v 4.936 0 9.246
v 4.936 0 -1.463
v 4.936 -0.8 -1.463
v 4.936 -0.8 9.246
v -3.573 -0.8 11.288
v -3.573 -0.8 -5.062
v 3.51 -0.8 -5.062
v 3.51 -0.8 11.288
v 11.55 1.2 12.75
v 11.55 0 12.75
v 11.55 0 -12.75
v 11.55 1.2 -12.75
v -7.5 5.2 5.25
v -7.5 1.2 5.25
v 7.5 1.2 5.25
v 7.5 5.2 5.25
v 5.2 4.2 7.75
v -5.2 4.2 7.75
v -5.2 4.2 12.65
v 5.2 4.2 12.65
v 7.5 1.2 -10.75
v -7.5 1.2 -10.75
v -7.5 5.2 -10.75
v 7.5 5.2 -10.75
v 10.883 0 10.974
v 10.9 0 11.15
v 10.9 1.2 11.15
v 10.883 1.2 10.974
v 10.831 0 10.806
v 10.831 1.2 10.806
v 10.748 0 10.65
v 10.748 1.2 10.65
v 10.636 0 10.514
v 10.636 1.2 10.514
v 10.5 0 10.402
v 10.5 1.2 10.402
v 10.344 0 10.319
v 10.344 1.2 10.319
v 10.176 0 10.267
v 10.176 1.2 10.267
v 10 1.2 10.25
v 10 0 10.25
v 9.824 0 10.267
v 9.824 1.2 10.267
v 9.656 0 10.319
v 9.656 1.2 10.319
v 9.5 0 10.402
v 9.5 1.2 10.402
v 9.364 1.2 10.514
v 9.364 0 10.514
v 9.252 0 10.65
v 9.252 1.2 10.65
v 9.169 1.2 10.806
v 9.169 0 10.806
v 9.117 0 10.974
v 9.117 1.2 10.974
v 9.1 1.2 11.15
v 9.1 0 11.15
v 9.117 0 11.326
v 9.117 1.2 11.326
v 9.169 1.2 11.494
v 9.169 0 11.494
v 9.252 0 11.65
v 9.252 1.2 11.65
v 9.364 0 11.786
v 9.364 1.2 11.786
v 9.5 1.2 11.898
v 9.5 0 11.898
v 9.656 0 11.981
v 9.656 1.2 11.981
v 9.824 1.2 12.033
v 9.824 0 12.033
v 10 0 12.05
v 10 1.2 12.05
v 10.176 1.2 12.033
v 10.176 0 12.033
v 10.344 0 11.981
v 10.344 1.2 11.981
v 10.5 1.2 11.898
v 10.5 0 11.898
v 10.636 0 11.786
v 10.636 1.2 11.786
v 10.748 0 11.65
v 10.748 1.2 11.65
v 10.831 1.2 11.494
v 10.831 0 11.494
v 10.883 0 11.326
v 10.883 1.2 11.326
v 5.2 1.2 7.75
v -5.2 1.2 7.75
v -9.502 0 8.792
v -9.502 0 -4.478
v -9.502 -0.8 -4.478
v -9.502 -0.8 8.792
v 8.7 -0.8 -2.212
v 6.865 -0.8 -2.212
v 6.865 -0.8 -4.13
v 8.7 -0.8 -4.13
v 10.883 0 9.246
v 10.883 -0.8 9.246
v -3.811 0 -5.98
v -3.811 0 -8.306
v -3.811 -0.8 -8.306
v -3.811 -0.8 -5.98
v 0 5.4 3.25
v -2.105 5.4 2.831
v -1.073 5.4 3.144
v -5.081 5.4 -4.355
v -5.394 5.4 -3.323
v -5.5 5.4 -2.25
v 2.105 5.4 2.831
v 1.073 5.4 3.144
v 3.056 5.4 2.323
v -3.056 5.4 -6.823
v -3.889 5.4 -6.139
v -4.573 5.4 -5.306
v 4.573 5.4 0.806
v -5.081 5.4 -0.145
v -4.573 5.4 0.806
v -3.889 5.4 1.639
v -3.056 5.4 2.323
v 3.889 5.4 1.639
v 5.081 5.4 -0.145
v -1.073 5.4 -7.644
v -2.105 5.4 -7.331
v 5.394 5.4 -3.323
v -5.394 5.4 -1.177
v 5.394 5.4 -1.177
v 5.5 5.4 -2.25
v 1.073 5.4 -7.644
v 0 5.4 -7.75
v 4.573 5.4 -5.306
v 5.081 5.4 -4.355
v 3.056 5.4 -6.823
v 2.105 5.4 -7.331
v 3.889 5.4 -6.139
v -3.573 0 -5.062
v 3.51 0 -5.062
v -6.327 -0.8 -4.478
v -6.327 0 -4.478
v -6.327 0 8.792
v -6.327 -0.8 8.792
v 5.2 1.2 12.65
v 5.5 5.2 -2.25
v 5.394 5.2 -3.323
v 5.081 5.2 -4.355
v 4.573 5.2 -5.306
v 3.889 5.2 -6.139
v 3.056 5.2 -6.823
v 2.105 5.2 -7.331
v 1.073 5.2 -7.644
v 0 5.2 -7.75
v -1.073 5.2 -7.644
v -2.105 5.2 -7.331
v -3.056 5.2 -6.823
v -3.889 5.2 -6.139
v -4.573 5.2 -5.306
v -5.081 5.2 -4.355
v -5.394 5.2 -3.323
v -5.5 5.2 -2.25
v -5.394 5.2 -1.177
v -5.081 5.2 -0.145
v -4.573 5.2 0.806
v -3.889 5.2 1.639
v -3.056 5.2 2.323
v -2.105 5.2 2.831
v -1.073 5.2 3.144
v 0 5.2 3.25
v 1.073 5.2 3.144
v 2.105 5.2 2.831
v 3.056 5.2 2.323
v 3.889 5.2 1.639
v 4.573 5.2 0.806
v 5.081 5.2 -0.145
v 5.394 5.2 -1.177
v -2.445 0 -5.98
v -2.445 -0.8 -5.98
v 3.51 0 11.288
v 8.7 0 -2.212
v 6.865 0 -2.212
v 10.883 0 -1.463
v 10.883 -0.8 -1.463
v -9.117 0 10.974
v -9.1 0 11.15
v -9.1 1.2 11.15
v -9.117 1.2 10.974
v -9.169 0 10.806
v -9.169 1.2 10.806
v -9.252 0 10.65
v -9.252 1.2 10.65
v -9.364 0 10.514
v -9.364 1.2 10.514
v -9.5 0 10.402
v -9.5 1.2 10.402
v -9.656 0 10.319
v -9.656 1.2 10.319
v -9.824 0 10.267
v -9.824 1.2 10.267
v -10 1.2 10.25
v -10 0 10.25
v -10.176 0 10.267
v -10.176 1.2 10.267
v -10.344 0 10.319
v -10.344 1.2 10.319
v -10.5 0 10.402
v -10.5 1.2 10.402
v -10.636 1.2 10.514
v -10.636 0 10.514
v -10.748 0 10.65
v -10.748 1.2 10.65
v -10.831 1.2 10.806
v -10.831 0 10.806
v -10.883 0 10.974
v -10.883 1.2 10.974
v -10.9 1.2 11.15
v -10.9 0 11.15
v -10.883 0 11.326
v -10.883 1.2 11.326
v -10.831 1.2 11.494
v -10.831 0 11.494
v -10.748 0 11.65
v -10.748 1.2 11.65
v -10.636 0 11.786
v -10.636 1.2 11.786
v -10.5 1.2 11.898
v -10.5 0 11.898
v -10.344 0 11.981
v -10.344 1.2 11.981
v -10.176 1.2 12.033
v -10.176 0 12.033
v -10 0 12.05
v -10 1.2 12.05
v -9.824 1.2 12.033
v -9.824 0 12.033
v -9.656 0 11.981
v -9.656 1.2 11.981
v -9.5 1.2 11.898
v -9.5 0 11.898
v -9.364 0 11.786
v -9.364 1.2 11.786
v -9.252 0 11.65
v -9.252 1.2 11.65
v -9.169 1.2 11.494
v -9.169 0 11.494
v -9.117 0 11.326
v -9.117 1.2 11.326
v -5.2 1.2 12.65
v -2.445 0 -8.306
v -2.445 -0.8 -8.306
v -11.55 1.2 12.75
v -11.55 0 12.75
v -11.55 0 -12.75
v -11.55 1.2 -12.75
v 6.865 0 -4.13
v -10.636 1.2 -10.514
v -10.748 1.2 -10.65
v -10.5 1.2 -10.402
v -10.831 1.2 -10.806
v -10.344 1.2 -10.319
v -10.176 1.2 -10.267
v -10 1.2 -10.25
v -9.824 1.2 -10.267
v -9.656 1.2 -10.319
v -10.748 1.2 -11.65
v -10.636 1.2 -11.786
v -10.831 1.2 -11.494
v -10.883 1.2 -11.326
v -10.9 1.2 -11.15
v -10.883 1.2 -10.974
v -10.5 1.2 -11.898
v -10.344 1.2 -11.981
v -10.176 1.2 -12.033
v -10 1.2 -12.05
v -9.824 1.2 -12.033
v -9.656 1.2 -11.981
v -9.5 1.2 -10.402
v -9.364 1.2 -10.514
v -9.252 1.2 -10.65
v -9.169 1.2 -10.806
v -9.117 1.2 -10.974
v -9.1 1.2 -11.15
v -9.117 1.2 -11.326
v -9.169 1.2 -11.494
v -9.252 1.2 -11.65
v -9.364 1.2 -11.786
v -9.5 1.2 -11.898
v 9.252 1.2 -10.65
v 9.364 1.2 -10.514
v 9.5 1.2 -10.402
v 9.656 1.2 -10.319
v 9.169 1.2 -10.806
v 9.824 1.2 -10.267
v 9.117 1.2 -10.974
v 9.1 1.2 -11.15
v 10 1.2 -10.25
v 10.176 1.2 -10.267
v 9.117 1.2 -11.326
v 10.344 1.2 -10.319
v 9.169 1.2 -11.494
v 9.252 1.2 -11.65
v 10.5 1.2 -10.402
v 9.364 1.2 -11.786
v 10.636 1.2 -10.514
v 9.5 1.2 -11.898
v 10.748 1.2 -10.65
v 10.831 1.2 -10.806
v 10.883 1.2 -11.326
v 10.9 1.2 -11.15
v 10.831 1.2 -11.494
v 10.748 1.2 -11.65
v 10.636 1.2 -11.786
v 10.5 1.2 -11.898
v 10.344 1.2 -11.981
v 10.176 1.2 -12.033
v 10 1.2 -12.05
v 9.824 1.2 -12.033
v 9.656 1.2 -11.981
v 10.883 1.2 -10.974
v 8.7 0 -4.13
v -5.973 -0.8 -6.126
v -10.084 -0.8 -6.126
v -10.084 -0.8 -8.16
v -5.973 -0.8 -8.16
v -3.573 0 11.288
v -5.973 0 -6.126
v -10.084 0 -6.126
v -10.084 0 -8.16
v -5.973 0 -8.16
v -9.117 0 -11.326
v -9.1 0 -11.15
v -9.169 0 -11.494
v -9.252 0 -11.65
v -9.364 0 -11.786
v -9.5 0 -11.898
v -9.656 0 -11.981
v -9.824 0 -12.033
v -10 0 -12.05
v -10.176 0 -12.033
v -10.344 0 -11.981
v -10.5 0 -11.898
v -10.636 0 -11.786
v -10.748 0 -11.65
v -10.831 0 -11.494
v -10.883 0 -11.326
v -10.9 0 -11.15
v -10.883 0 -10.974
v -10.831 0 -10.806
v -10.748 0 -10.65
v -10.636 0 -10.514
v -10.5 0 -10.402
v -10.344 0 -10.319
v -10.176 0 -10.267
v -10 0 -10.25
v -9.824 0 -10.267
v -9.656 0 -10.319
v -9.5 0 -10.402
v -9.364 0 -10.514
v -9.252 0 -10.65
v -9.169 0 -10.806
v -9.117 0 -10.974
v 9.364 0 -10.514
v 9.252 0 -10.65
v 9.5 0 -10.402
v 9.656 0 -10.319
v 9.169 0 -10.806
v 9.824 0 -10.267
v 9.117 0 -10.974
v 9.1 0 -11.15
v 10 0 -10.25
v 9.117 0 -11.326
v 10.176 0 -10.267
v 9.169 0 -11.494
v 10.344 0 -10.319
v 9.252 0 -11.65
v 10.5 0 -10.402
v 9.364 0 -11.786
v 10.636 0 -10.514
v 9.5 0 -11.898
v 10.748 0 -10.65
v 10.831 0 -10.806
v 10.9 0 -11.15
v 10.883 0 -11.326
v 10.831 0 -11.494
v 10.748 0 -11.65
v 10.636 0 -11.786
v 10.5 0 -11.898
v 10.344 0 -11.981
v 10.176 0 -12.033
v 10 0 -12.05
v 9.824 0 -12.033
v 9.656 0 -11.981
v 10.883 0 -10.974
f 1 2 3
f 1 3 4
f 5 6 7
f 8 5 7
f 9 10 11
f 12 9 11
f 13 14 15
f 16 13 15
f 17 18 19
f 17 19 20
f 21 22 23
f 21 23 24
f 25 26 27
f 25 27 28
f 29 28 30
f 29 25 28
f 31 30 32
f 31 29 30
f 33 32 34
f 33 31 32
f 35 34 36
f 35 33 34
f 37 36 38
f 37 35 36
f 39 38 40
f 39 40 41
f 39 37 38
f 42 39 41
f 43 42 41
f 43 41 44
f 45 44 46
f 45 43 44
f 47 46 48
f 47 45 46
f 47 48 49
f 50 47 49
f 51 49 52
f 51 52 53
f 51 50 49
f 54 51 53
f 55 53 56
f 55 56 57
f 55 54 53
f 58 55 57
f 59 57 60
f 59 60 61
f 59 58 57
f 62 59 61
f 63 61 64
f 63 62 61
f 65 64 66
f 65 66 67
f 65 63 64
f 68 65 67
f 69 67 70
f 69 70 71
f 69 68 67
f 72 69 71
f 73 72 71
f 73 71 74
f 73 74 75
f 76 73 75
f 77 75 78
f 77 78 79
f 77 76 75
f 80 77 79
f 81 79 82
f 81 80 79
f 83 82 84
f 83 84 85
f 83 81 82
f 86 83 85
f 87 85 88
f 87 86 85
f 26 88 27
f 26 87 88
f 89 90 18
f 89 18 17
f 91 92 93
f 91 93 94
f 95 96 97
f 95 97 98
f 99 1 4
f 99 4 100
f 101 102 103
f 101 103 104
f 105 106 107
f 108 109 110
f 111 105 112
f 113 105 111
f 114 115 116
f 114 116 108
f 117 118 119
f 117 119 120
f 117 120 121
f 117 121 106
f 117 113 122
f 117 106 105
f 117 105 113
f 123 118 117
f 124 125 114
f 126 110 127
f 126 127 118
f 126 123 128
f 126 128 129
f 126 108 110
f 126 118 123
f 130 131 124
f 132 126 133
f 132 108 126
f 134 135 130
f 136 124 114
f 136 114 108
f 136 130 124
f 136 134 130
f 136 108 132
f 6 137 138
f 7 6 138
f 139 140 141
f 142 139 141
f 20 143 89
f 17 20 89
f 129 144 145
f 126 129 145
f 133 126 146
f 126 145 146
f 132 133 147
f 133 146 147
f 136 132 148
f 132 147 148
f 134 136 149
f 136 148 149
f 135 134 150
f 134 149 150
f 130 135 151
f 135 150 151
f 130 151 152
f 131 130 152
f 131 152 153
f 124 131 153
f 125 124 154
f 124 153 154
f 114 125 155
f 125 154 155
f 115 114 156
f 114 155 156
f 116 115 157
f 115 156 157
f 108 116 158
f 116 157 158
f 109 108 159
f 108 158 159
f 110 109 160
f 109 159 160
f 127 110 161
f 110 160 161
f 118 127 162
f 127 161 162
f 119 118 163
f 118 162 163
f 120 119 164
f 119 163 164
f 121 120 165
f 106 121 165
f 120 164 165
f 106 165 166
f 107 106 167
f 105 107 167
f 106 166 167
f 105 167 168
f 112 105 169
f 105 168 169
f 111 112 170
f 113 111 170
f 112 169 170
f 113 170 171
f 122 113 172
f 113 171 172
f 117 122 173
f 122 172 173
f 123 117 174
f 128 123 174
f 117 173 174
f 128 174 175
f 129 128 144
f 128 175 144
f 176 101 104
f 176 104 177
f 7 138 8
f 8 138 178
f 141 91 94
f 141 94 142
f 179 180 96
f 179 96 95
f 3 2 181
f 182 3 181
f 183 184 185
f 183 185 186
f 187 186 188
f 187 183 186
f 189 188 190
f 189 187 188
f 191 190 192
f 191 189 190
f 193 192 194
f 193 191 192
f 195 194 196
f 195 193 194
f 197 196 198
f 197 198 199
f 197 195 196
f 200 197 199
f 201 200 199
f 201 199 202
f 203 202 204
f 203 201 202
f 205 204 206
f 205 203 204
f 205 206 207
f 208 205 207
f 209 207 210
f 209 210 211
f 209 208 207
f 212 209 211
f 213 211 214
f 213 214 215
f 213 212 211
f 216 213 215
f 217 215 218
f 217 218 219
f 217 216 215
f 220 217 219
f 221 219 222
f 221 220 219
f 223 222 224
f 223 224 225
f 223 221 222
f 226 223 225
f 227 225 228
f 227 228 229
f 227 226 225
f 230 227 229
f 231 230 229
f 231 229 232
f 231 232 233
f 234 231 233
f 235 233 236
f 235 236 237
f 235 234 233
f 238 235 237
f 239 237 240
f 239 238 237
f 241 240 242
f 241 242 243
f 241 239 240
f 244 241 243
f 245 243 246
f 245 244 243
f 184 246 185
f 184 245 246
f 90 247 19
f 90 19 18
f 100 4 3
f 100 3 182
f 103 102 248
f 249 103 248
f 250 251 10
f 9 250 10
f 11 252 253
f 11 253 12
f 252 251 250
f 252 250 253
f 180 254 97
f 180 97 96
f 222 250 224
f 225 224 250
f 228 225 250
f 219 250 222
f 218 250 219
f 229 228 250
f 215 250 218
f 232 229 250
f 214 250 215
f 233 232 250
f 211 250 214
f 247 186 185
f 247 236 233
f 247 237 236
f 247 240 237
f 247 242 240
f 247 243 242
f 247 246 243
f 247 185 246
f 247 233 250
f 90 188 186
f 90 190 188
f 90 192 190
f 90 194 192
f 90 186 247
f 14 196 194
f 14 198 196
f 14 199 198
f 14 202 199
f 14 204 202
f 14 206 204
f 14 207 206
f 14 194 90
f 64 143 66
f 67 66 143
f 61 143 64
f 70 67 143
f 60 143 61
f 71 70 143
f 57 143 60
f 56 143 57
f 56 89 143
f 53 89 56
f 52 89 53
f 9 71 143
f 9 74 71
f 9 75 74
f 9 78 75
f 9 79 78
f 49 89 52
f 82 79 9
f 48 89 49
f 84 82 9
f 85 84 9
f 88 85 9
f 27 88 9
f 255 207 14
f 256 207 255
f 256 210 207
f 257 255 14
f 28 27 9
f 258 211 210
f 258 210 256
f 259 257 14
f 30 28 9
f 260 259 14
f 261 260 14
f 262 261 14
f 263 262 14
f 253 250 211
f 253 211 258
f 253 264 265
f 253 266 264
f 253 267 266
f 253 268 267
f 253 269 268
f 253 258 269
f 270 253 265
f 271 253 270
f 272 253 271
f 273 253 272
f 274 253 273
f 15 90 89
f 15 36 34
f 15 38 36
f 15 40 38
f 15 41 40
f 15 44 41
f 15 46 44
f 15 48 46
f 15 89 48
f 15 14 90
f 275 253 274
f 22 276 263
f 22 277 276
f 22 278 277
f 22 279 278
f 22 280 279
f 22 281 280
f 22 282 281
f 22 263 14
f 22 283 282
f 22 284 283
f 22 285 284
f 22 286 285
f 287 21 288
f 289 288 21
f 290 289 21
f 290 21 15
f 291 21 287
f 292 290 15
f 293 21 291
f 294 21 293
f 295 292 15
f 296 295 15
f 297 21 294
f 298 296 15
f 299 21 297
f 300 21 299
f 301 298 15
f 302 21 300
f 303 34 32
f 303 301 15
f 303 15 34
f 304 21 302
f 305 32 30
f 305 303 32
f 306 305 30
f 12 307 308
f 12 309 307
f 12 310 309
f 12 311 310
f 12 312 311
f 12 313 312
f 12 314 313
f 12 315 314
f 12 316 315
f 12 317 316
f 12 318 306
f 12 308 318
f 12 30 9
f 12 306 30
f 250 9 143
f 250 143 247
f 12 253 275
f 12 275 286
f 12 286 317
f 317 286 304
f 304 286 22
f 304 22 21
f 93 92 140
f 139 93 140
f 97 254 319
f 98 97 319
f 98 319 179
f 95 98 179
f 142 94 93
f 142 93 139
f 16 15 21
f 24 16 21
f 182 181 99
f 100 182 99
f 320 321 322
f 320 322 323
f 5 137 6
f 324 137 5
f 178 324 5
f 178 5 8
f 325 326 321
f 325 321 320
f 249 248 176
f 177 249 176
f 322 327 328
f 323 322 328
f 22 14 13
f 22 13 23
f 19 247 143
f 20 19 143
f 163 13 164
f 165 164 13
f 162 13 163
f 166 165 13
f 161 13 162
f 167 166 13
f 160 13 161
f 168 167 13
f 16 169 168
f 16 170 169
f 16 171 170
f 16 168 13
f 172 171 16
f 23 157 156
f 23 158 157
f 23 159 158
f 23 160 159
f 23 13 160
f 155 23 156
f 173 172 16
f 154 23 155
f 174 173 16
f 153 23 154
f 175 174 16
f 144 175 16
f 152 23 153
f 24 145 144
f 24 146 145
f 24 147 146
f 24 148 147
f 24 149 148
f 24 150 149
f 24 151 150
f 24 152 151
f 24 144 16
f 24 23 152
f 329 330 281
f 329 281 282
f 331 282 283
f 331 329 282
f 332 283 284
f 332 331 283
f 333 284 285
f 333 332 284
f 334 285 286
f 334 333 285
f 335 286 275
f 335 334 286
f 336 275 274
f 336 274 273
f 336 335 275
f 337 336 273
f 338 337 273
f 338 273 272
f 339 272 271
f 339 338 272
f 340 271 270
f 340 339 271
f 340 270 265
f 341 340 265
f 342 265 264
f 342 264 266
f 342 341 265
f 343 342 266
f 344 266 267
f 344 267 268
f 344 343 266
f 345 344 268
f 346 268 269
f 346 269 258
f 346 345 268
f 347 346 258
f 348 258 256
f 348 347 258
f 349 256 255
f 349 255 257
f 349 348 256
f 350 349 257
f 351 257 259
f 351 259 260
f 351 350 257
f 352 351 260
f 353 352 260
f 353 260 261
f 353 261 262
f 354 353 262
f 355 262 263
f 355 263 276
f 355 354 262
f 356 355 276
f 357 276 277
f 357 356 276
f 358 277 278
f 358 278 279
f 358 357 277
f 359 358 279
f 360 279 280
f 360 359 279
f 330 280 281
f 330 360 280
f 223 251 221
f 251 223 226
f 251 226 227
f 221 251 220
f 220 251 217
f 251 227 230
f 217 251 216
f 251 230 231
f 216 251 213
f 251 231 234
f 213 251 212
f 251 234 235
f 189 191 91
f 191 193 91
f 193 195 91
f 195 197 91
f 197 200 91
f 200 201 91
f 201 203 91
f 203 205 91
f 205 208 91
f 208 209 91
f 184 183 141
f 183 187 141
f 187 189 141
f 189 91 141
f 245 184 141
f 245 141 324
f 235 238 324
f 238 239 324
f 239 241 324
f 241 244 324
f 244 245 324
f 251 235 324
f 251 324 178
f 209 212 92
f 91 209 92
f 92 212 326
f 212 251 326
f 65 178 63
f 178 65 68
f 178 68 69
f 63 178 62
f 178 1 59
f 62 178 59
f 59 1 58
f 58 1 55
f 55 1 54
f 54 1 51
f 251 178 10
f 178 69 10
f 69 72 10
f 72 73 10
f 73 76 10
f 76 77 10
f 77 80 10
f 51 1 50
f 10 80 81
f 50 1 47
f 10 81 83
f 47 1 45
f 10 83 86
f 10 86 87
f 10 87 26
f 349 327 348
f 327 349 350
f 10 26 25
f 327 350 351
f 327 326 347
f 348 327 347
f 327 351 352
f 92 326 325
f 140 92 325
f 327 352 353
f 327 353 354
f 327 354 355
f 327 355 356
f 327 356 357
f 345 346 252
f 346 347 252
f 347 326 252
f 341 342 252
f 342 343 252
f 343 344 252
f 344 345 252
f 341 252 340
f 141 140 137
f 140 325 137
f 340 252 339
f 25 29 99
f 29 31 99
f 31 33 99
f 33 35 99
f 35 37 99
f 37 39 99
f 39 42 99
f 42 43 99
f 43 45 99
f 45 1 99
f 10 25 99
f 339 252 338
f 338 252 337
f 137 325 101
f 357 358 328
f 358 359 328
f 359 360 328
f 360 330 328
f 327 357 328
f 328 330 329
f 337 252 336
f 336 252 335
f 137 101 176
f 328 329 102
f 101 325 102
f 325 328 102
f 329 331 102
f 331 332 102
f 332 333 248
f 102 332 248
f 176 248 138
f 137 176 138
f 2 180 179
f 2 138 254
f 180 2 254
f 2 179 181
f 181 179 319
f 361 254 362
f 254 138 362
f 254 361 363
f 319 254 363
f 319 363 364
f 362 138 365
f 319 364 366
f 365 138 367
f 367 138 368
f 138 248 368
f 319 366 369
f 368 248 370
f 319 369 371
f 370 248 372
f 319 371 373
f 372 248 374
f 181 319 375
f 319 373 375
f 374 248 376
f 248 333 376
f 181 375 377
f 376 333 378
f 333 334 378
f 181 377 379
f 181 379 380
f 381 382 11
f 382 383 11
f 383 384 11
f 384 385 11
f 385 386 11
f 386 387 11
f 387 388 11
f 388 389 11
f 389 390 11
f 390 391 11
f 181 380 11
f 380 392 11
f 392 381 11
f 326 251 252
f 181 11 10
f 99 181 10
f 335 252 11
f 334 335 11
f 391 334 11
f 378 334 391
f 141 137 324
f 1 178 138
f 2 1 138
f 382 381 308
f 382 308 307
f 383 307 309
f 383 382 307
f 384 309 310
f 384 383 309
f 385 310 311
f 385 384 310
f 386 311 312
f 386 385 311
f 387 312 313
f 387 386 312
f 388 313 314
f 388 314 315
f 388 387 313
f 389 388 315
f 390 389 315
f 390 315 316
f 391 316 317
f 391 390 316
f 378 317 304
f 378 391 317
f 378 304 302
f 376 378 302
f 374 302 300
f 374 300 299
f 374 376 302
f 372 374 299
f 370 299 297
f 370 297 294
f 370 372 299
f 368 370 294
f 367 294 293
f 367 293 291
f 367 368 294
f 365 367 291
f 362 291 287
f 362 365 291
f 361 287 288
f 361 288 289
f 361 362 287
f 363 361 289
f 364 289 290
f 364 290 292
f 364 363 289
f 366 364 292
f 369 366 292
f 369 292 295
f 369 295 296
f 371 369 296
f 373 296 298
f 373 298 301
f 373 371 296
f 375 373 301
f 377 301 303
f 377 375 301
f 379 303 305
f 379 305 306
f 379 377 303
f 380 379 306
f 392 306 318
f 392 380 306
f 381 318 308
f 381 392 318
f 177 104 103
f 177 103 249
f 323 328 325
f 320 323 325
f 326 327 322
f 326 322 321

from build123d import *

# Parameters (mm, degrees)
SKETCH_1_W      = 23.1
SKETCH_1_H      = 25.5
SKETCH_1_R      = 0.9
EXTRUDE_1_DEPTH = 1.2
SKETCH_2_W      = 15
SKETCH_2_H      = 16
EXTRUDE_2_DEPTH = 4
SKETCH_3_R      = 5.5
EXTRUDE_3_DEPTH = 0.2
SKETCH_4_W      = 10.4
SKETCH_4_H      = 4.9
EXTRUDE_4_DEPTH = 3
SKETCH_5_W      = 7.083649358
SKETCH_5_H      = 16.349953635
SKETCH_5_W_2    = 1.366011138
SKETCH_5_H_2    = 2.325890212
SKETCH_5_W_3    = 1.835080991
SKETCH_5_H_3    = 1.91855554
SKETCH_5_W_4    = 3.175010274
SKETCH_5_H_4    = 13.27010499
SKETCH_5_W_5    = 4.111087422
SKETCH_5_H_5    = 2.03375188
SKETCH_5_W_6    = 5.947363934
SKETCH_5_H_6    = 10.708861721
EXTRUDE_5_DEPTH = 0.8


with BuildPart() as part:
    # 草图1 → 凸台-拉伸1 (new body)
    with BuildSketch(Plane(origin=(0, 0, 0), x_dir=(1, 0, 0), z_dir=(0, 1, 0))):
        Rectangle(SKETCH_1_W, SKETCH_1_H)
        with Locations((10, 11.15)):
            Circle(SKETCH_1_R, mode=Mode.SUBTRACT)
        with Locations((-10, 11.15)):
            Circle(SKETCH_1_R, mode=Mode.SUBTRACT)
        with Locations((10, -11.15)):
            Circle(SKETCH_1_R, mode=Mode.SUBTRACT)
        with Locations((-10, -11.15)):
            Circle(SKETCH_1_R, mode=Mode.SUBTRACT)
    extrude(amount=EXTRUDE_1_DEPTH)

    # 草图2 → 凸台-拉伸2 (add)
    with BuildSketch(Plane(origin=(0, 1.2, 0), x_dir=(1, 0, 0), z_dir=(0, 1, 0))):
        with Locations((0, 2.75)):
            Rectangle(SKETCH_2_W, SKETCH_2_H)
    extrude(amount=EXTRUDE_2_DEPTH)

    # 草图3 → 凸台-拉伸3 (add)
    with BuildSketch(Plane(origin=(0, 5.2, 0), x_dir=(1, 0, 0), z_dir=(0, 1, 0))):
        with Locations((0, 2.25)):
            Circle(SKETCH_3_R)
    extrude(amount=EXTRUDE_3_DEPTH)

    # 草图4 → 凸台-拉伸4 (add)
    with BuildSketch(Plane(origin=(0, 1.2, 0), x_dir=(1, 0, 0), z_dir=(0, 1, 0))):
        with Locations((0, -10.2)):
            Rectangle(SKETCH_4_W, SKETCH_4_H)
    extrude(amount=EXTRUDE_4_DEPTH)

    # 草图5 → 凸台-拉伸5 (add)
    with BuildSketch(Plane.XZ):
        with Locations((-0.031355778, 3.113299148)):
            Rectangle(SKETCH_5_W, SKETCH_5_H)
        with Locations((-3.127935708, -7.143071696)):
            Rectangle(SKETCH_5_W_2, SKETCH_5_H_2)
        with Locations((7.782140552, -3.170898119)):
            Rectangle(SKETCH_5_W_3, SKETCH_5_H_3)
        with Locations((-7.914690991, 2.157353718)):
            Rectangle(SKETCH_5_W_4, SKETCH_5_H_4)
        with Locations((-8.028697172, -7.143071696)):
            Rectangle(SKETCH_5_W_5, SKETCH_5_H_5)
        with Locations((7.909232795, 3.891185517)):
            Rectangle(SKETCH_5_W_6, SKETCH_5_H_6)
    extrude(amount=EXTRUDE_5_DEPTH)


solid = part.part
